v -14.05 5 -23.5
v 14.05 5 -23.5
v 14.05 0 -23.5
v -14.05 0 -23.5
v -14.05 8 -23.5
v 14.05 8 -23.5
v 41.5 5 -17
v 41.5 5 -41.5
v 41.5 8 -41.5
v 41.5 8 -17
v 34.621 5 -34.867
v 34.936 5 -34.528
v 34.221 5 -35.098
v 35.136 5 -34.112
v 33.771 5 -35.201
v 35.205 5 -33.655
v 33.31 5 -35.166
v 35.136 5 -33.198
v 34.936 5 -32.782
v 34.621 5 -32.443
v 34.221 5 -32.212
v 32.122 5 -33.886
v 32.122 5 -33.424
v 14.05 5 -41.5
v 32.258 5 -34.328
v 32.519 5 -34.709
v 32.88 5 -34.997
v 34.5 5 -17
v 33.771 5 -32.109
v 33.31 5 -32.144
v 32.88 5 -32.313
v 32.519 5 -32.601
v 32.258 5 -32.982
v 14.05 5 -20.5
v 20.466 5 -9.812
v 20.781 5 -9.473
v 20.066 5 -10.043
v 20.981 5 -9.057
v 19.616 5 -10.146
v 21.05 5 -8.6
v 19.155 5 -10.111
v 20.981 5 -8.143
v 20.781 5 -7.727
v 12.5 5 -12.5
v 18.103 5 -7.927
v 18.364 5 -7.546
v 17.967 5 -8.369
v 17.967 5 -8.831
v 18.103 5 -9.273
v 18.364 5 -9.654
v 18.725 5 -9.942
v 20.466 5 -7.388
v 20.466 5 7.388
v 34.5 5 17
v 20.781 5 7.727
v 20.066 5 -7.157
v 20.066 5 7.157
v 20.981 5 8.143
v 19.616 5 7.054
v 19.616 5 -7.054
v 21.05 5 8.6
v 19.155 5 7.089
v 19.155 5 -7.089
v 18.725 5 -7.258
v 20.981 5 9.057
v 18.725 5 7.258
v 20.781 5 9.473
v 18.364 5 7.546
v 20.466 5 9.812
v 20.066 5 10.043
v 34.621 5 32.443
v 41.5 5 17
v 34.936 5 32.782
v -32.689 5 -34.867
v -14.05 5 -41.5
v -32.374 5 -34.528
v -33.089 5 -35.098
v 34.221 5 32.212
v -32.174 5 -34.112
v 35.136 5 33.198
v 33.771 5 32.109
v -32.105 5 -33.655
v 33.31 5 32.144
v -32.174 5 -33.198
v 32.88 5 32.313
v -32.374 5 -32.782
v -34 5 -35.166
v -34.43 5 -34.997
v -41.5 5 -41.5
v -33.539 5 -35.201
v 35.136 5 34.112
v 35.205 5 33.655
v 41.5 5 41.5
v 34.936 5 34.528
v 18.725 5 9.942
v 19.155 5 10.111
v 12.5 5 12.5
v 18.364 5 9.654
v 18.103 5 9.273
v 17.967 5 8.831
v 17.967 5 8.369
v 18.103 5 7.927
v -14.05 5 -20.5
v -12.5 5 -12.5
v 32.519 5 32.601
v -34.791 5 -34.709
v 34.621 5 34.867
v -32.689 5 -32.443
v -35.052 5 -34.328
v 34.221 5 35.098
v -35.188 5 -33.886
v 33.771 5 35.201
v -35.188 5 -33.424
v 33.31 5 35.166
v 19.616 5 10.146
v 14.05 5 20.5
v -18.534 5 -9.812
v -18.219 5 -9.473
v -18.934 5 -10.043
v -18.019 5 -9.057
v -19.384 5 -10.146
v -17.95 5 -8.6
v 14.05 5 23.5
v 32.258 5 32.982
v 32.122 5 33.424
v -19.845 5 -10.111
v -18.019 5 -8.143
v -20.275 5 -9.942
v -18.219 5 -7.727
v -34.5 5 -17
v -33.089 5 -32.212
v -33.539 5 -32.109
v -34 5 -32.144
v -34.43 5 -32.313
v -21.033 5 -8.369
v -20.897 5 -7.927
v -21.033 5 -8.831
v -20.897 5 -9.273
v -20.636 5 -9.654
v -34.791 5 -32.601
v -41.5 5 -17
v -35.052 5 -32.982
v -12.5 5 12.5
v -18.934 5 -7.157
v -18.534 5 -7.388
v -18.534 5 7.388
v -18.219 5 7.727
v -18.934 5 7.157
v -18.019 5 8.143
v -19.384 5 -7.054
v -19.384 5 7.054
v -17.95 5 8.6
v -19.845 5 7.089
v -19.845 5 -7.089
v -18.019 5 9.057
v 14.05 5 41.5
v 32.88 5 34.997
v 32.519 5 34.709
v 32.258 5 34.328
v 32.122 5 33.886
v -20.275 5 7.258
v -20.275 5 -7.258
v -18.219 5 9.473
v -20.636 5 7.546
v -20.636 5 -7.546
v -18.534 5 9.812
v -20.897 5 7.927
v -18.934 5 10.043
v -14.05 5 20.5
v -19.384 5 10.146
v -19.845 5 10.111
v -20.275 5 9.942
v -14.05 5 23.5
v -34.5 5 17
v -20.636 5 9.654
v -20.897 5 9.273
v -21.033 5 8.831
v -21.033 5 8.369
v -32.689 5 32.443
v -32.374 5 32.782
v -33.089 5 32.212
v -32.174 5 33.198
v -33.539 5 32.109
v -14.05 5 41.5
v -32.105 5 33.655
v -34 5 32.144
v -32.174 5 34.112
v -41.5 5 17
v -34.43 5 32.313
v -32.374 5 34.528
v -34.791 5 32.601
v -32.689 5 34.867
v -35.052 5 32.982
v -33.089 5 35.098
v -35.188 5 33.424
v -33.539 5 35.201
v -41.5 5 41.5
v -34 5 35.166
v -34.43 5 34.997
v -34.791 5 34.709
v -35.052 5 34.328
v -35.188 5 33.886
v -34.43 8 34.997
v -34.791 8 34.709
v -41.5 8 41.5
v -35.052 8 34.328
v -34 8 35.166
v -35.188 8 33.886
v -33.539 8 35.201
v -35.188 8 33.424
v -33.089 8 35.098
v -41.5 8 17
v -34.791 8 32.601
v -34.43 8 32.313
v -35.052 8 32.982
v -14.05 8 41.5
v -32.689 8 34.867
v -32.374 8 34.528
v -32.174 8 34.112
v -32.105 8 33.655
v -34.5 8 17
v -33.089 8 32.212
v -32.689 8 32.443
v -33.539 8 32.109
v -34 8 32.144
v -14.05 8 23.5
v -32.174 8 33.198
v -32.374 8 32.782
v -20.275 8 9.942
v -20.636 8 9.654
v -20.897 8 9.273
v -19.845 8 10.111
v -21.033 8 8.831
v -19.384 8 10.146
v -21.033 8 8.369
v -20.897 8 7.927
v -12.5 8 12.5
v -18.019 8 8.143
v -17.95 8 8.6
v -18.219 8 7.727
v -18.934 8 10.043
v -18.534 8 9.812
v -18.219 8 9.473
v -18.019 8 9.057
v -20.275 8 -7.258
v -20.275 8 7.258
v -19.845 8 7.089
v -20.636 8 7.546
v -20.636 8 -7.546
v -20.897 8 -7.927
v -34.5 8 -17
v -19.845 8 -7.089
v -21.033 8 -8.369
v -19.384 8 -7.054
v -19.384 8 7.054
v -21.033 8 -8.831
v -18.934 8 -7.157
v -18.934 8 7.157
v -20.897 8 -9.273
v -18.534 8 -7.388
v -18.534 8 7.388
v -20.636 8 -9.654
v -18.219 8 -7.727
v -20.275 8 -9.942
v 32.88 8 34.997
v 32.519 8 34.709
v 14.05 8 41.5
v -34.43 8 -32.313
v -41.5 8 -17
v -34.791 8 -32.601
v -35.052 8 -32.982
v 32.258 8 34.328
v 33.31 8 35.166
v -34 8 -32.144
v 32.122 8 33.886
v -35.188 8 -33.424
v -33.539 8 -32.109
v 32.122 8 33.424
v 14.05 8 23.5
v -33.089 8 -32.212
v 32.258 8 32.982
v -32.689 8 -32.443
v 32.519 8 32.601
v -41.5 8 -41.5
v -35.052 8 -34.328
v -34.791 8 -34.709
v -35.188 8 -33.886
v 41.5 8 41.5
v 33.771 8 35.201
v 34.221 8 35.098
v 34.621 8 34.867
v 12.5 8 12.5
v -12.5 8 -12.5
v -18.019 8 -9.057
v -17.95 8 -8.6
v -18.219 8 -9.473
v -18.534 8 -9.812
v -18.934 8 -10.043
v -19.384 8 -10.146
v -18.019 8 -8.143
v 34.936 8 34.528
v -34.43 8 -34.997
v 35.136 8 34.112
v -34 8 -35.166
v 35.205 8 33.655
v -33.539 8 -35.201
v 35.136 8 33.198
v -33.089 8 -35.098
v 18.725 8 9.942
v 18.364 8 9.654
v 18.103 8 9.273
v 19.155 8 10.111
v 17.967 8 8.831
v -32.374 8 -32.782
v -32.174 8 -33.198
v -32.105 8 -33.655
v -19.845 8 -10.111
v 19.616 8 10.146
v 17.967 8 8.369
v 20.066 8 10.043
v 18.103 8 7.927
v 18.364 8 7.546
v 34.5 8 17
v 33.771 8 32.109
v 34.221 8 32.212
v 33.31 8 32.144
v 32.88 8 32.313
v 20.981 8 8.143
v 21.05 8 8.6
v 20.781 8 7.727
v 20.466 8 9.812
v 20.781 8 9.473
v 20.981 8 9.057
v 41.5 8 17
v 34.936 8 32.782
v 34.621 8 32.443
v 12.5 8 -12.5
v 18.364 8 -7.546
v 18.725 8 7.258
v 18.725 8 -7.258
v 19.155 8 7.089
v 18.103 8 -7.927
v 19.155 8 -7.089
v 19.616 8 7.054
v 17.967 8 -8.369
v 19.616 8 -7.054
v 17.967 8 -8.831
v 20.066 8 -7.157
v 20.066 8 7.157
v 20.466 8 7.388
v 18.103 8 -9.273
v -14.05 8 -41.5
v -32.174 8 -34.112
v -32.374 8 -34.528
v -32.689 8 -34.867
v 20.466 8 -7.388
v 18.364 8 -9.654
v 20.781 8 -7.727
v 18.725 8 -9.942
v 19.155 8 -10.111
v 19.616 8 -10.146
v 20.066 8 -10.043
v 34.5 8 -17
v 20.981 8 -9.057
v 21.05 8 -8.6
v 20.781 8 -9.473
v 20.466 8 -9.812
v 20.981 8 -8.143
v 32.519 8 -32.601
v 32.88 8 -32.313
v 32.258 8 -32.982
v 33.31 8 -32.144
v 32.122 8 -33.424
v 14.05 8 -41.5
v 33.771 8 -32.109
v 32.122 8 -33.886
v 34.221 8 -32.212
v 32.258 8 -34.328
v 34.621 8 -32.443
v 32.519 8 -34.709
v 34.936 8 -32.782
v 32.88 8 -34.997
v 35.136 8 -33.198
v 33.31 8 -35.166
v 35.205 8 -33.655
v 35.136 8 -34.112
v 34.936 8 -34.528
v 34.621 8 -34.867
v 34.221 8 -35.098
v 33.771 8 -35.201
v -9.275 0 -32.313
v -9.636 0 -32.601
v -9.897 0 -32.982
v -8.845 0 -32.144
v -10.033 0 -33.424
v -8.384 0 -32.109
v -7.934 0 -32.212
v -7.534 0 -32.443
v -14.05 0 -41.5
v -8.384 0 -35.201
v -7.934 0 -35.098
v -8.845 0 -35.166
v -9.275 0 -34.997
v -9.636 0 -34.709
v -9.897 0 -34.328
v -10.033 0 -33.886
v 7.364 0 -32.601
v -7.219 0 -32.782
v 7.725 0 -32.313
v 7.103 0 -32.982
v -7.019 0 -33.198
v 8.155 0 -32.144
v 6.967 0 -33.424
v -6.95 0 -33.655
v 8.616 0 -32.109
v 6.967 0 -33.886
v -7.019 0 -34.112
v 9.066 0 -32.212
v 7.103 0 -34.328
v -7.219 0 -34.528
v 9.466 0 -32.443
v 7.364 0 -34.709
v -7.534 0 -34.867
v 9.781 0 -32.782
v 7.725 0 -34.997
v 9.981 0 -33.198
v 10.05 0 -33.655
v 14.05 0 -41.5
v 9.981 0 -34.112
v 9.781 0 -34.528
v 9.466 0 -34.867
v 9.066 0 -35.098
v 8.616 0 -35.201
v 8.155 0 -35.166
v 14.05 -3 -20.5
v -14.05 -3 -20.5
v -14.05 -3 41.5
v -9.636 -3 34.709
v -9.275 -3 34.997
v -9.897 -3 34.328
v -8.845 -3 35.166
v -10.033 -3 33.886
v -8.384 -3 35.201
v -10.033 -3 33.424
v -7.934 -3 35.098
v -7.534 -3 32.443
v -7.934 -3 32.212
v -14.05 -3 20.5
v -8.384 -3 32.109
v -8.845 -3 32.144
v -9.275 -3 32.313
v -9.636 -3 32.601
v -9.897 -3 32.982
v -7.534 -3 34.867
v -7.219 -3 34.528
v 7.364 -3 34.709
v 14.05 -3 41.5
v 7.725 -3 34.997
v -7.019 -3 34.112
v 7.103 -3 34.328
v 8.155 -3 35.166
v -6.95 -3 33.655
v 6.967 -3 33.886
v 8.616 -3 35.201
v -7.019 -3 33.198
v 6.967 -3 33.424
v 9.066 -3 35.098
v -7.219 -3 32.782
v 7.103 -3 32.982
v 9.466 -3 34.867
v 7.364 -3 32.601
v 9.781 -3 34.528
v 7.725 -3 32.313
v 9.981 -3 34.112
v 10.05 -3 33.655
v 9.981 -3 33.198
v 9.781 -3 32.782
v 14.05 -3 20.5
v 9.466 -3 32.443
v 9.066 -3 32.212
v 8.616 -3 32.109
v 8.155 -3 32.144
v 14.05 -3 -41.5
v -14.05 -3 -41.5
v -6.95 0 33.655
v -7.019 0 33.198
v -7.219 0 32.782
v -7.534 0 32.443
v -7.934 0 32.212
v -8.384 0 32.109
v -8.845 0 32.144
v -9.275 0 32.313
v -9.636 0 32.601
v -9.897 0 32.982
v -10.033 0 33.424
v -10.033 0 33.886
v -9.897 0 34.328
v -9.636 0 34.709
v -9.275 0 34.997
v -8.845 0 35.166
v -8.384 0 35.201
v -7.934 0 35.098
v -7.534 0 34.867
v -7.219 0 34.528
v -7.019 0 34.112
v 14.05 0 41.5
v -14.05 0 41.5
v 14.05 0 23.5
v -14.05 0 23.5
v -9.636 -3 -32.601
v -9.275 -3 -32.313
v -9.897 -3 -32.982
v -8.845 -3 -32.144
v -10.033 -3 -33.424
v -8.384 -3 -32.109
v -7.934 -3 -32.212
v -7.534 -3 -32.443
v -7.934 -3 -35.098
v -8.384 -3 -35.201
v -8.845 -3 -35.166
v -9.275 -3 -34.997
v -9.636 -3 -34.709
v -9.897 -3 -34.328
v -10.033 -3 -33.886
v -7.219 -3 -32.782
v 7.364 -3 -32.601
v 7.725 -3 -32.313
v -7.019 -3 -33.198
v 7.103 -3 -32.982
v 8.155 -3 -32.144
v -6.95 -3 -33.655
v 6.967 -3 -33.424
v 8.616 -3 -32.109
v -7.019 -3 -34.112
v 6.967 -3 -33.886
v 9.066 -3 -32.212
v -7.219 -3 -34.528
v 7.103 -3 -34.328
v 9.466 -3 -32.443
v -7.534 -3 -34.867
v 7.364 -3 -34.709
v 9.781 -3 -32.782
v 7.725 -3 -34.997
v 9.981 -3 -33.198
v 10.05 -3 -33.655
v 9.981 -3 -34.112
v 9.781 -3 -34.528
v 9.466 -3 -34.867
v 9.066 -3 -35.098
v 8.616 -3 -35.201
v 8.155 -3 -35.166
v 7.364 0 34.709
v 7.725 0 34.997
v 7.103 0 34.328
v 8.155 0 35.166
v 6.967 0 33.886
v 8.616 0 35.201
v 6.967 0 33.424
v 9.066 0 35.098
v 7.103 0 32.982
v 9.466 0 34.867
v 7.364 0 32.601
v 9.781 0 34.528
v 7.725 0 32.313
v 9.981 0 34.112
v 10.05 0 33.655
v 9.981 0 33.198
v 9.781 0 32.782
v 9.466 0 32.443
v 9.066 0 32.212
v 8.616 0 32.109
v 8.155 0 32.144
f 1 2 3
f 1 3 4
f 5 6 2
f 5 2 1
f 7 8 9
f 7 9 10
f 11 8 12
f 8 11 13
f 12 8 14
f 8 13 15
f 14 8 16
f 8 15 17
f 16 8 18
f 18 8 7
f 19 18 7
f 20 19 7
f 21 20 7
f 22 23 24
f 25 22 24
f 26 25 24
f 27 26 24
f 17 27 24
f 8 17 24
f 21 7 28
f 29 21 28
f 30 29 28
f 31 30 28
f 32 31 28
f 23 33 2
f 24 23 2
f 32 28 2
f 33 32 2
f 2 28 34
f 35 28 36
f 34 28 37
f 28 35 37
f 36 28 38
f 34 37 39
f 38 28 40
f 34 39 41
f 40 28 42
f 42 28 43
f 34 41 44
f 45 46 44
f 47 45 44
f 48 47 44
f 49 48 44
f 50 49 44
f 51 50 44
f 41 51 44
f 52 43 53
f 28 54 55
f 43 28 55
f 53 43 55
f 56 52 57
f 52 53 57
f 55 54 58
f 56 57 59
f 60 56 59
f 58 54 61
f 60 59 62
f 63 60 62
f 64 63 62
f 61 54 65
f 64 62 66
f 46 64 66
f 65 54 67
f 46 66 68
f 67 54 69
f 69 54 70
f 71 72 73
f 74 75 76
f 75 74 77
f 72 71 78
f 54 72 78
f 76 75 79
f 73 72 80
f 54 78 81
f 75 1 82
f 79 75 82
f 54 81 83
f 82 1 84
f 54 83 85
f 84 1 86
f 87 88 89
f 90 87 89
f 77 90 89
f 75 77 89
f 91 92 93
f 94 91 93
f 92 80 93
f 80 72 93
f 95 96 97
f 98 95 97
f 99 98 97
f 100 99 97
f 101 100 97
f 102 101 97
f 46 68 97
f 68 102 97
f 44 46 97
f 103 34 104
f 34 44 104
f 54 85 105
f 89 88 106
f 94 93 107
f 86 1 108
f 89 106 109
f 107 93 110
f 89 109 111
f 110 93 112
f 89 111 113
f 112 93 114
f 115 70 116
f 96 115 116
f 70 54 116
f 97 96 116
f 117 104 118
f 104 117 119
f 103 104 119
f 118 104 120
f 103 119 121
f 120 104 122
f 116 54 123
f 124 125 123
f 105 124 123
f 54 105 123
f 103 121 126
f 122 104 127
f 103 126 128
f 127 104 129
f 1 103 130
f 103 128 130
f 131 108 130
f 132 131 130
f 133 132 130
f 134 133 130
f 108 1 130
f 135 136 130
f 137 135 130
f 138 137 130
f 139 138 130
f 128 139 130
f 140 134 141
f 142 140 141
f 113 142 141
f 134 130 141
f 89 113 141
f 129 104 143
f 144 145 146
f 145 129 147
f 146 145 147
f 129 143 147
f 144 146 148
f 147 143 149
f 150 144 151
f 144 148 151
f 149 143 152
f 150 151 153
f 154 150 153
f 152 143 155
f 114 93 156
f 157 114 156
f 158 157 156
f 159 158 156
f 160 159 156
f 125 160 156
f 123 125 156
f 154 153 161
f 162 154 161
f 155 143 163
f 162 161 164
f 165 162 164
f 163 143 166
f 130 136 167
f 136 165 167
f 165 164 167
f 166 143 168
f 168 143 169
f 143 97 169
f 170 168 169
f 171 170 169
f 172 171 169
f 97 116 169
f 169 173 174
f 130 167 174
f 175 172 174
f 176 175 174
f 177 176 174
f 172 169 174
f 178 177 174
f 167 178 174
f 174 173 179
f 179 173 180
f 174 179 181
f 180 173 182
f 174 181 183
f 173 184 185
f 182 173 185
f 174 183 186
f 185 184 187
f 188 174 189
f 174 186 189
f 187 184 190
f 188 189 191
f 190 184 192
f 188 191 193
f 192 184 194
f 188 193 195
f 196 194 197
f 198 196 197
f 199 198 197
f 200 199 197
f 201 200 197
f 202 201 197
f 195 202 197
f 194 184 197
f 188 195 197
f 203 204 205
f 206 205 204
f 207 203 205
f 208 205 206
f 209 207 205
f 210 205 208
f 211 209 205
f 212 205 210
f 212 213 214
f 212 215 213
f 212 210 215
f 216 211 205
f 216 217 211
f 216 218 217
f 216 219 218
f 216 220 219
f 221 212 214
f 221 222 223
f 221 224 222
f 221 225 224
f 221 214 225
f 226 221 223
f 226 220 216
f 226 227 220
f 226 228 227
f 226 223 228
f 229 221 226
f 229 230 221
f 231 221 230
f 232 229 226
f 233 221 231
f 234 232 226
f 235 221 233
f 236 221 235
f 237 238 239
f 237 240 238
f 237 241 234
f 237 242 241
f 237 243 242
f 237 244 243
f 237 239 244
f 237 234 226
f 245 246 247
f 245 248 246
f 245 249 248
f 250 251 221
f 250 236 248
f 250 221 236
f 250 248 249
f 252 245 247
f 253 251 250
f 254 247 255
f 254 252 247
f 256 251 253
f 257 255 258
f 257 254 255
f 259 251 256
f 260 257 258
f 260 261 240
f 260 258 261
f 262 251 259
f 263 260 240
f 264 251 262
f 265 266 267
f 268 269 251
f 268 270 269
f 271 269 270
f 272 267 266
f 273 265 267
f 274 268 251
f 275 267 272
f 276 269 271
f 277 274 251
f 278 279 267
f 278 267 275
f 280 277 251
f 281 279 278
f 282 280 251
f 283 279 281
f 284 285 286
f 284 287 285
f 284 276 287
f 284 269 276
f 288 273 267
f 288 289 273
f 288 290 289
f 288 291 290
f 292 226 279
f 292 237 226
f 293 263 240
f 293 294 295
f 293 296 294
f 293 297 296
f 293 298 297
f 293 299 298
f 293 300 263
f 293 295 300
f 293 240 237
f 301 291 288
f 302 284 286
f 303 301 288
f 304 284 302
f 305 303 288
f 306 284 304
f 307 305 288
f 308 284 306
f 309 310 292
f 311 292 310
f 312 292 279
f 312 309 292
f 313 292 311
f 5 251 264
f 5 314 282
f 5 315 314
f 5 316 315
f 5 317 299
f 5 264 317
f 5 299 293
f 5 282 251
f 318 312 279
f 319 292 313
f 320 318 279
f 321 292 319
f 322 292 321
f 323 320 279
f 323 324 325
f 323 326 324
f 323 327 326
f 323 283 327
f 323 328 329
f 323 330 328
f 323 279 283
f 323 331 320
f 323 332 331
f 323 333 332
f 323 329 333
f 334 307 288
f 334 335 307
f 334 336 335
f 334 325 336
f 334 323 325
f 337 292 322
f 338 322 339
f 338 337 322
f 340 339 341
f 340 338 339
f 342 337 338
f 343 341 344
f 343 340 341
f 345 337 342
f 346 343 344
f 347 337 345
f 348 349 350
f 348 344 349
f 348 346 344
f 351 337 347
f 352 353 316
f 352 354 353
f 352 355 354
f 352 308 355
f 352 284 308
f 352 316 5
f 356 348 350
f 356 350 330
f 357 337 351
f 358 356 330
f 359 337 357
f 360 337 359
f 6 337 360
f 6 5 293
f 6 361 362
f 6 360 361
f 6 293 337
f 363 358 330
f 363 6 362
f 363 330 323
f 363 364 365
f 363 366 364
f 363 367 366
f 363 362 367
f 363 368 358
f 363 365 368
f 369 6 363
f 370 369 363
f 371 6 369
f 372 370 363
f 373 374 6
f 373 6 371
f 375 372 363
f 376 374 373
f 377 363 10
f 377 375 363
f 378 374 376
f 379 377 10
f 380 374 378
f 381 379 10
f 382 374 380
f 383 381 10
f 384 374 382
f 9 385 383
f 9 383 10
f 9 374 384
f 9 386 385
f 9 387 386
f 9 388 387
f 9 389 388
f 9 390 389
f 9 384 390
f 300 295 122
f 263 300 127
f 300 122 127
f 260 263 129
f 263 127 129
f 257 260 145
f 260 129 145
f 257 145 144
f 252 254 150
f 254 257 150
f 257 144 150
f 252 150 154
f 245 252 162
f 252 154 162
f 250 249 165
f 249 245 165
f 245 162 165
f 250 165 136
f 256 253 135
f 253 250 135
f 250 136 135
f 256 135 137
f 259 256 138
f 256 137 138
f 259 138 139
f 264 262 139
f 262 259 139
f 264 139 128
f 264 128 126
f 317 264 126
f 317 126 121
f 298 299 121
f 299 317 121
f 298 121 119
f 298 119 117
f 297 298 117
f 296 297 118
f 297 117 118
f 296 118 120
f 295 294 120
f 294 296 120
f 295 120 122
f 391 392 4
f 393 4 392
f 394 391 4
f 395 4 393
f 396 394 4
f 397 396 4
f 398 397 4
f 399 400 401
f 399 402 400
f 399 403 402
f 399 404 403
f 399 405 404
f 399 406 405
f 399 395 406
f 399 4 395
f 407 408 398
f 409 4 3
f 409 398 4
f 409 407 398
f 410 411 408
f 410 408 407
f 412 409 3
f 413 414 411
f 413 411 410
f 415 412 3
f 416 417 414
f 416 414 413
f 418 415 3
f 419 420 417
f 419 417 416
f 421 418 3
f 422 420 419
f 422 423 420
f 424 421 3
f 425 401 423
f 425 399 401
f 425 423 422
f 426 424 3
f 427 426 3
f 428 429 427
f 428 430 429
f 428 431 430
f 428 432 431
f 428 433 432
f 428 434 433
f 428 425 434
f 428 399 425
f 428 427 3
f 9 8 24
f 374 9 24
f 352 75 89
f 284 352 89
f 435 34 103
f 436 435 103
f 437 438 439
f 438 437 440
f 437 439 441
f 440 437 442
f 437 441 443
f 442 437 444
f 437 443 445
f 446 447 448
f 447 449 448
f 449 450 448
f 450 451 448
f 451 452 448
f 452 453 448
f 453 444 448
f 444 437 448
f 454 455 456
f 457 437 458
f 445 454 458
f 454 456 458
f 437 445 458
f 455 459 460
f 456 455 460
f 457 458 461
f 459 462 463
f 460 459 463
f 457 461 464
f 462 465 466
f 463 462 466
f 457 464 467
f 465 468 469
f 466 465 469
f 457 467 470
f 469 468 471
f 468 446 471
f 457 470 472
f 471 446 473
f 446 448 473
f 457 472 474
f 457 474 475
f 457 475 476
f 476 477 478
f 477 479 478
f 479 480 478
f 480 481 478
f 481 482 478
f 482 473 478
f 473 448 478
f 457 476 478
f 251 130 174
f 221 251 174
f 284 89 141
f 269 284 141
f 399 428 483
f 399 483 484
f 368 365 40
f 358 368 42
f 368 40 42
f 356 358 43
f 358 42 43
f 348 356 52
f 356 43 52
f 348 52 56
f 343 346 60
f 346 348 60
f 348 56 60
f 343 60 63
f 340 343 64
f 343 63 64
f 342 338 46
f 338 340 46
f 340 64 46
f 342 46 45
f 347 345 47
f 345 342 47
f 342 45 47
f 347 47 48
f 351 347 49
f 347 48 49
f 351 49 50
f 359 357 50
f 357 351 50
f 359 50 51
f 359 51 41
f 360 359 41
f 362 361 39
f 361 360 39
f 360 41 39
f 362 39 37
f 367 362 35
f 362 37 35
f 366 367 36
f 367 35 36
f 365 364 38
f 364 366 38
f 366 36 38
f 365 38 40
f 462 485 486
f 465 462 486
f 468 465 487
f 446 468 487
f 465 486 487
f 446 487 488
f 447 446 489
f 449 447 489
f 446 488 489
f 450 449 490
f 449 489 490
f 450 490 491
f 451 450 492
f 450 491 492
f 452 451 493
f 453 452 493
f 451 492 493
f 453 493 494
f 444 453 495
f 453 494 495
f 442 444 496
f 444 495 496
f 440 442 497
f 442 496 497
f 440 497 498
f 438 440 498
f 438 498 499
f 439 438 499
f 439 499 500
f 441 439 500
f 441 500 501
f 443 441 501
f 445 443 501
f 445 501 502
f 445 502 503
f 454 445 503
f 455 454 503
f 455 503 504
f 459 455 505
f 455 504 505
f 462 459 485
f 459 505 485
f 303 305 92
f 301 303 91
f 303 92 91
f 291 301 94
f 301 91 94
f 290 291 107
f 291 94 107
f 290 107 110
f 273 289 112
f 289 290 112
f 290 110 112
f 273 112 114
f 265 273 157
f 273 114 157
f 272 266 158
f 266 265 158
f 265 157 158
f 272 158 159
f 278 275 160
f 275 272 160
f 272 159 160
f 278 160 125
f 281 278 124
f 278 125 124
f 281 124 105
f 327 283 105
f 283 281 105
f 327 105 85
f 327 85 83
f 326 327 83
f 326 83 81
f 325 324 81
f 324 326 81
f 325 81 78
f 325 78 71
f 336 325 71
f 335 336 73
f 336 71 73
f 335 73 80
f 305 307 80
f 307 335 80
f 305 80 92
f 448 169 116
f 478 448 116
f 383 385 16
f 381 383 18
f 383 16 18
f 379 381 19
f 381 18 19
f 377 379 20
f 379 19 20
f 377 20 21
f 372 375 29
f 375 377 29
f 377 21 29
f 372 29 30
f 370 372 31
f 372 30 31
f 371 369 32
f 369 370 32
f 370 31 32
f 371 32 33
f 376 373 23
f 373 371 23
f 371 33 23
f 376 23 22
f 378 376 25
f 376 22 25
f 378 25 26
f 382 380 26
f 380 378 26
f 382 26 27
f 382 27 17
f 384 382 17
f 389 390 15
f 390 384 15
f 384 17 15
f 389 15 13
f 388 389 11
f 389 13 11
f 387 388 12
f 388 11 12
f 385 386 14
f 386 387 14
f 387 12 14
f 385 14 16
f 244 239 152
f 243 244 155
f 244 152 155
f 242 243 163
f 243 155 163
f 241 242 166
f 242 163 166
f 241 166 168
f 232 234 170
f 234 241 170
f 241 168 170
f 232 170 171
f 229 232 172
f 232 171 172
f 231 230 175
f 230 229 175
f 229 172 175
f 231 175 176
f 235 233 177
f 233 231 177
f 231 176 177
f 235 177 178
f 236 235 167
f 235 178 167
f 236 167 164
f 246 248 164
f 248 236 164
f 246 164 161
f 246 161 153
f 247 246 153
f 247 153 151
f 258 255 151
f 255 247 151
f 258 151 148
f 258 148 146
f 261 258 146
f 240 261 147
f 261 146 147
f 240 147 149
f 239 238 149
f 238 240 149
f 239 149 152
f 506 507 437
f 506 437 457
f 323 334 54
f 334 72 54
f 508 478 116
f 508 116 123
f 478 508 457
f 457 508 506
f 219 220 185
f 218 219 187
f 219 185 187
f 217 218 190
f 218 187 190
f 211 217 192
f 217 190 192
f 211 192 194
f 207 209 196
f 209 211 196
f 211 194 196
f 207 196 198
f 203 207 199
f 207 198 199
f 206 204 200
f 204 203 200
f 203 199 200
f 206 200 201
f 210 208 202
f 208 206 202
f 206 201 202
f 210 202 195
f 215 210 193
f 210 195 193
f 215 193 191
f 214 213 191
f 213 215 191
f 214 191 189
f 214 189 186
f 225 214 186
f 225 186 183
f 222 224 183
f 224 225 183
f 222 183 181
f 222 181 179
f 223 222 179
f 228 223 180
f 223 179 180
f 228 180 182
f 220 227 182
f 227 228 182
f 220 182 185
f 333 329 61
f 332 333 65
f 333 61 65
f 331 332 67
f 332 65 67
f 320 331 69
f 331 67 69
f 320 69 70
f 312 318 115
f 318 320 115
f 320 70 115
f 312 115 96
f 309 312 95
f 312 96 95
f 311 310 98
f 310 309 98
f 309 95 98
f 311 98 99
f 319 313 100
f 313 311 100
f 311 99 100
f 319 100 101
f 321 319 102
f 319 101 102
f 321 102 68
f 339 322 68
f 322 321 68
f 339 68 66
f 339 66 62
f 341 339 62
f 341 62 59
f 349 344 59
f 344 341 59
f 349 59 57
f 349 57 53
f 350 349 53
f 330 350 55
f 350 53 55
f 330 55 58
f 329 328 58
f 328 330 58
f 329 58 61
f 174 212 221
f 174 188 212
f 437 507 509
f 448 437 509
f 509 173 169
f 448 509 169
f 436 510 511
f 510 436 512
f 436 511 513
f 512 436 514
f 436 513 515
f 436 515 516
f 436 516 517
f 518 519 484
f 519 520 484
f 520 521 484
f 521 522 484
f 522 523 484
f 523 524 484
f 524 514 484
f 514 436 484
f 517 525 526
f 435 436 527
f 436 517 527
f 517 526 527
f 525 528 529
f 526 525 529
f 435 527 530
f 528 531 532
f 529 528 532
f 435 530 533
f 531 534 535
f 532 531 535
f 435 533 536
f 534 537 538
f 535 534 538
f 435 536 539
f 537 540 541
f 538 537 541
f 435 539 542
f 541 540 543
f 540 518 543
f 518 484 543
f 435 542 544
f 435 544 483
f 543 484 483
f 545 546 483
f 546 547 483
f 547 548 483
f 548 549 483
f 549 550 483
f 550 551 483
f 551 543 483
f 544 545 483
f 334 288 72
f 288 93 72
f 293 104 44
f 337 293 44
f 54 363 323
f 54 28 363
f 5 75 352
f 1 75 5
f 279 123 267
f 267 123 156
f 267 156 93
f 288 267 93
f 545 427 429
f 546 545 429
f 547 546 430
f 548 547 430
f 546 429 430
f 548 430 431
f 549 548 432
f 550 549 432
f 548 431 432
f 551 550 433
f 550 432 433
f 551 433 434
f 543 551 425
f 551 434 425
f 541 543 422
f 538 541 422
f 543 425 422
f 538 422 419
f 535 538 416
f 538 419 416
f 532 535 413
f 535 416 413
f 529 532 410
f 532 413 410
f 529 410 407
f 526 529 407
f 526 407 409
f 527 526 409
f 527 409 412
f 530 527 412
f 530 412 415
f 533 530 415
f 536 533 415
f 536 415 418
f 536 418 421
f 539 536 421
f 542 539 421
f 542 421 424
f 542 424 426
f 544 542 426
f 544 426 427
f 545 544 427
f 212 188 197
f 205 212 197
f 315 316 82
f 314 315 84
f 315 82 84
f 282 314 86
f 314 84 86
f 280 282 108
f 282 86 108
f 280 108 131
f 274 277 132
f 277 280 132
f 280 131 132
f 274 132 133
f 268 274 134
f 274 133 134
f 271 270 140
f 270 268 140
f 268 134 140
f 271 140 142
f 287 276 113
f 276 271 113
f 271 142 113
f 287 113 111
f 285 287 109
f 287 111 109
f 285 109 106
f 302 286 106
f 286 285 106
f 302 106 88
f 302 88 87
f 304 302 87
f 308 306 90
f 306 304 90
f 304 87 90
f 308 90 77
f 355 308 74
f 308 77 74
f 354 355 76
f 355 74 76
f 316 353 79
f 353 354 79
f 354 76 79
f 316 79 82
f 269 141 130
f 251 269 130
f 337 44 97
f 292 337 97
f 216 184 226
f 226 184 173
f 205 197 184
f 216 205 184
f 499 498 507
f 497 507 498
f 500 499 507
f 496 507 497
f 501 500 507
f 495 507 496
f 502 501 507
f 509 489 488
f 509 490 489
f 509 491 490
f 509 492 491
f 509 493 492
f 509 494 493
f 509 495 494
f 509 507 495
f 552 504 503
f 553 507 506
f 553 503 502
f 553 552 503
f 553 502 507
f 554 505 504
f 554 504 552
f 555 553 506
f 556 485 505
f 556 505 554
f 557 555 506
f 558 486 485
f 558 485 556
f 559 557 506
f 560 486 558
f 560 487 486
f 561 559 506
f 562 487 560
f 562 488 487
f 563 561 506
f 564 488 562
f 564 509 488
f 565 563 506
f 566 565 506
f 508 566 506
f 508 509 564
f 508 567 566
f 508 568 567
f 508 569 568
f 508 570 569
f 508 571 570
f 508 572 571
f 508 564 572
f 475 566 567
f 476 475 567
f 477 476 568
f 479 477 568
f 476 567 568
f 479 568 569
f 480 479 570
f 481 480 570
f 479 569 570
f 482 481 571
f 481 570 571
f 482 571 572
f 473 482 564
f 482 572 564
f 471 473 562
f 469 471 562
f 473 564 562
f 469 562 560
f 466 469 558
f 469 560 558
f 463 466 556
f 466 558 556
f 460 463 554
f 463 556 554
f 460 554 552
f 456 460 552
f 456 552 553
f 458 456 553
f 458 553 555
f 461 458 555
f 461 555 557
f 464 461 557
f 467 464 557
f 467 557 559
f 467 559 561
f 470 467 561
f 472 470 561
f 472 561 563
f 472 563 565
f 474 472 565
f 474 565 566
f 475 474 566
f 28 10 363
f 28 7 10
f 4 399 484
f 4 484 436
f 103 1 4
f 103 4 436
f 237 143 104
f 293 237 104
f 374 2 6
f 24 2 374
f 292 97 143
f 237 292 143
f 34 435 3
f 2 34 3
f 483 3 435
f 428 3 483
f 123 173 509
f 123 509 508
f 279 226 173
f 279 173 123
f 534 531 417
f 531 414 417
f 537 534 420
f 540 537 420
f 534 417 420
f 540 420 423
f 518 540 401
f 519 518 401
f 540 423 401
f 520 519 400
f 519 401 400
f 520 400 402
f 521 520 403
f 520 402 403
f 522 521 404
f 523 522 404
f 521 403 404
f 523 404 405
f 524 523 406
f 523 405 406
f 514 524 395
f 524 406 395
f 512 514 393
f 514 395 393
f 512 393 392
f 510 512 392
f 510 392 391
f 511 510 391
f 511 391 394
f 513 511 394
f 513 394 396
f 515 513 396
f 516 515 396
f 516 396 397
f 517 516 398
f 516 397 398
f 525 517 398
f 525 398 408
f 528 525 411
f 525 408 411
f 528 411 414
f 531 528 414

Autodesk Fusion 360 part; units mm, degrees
sketch "Sketch1" plane through (0, 0, 0) normal (0, 1, 0) x (1, 0, 0)
  line L0 (41.5, 41.5) -> (-41.5, 41.5)
  line L1 (-41.5, -41.5) -> (41.5, -41.5)
  line L2 (-41.5, 41.5) -> (41.5, -41.5) construction
  line L3 (41.5, 41.5) -> (41.5, 17)
  line L4 (41.5, 17) -> (34.5, 17)
  line L5 (-41.5, 41.5) -> (-41.5, 17)
  line L6 (-41.5, 17) -> (-34.5, 17)
  line L7 (-41.5, -17) -> (-34.5, -17)
  line L8 (41.5, -17) -> (34.5, -17)
  line L9 (-34.5, 17) -> (-34.5, -17)
  line L10 (34.5, 17) -> (34.5, -17)
  line L11 (-41.5, 41.5) -> (-41.5, 17)
  line L12 (-41.5, -17) -> (-41.5, -41.5)
  line L13 (-41.5, -41.5) -> (-41.5, -17)
  line L14 (-41.5, 17) -> (-41.5, 41.5)
  line L15 (41.5, -41.5) -> (41.5, -17)
  line L16 (41.5, 17) -> (41.5, 41.5)
  line L17 (41.5, 41.5) -> (41.5, 17)
  line L18 (41.5, -17) -> (41.5, -41.5)
  line L19 (-34.5, 17) -> (-34.5, 8.6)
  line L20 (-34.5, -17) -> (-34.5, -8.6)
  line L21 (34.5, 17) -> (34.5, 8.6)
  line L22 (34.5, -17) -> (34.5, -8.6)
  line L23 (-41.5, 41.5) -> (-33.655, 41.5)
  line L24 (-33.655, 41.5) -> (-41.5, 41.5)
  line L25 (-41.5, 41.5) -> (-41.5, 33.655)
  circle A0 centre (-33.655, 33.655) radius 1.55
  circle A1 centre (33.655, 33.655) radius 1.55
  circle A2 centre (-33.655, -33.655) radius 1.55
  circle A3 centre (33.655, -33.655) radius 1.55
  line L26 (11, 11) -> (-11, -11) construction
  line L27 (-11, 11) -> (11, -11) construction
  line L28 (12.5, -12.5) -> (-12.5, -12.5)
  line L29 (-12.5, -12.5) -> (-12.5, 12.5)
  line L30 (-12.5, 12.5) -> (12.5, 12.5)
  line L31 (12.5, 12.5) -> (12.5, -12.5)
  line L32 (12.5, -12.5) -> (-12.5, 12.5) construction
  line L33 (-12.5, -12.5) -> (12.5, 12.5) construction
  line L34 (-41.5, 41.5) -> (-14.05, 41.5)
  line L35 (-14.05, 41.5) -> (-8.5, 41.5)
  circle A4 centre (-8.5, 33.655) radius 1.55
  circle A5 centre (8.5, 33.655) radius 1.55
  line L36 (-14.05, 41.5) -> (-14.05, 23.5)
  line L37 (-14.05, 23.5) -> (14.05, 23.5)
  line L38 (14.05, 23.5) -> (14.05, 41.5)
  line L39 (-14.05, -23.5) -> (14.05, -23.5)
  circle A6 centre (8.5, -33.655) radius 1.55
  circle A7 centre (-8.5, -33.655) radius 1.55
  line L40 (-14.05, -41.5) -> (-14.05, -23.5)
  line L41 (14.05, -23.5) -> (14.05, -41.5)
  circle A8 centre (-19.5, 8.6) radius 1.55
  circle A9 centre (-19.5, -8.6) radius 1.55
  circle A10 centre (19.5, 8.6) radius 1.55
  circle A11 centre (19.5, -8.6) radius 1.55
  point P0 (-19.5, 8.6)
  point P1 (19.5, 8.6)
  dimension "d1" = 83
  dimension "d2" = 83
  dimension "d31" = 27.45
  dimension "d32" = 5.55
  dimension "d33" = 7.845
  dimension "d34" = 17
  dimension "d35" = 3.1
  dimension "d36" = 3.1
  dimension "d37" = 18
  dimension "d39" = 18
  dimension "d40" = 3.1
extrude "Extrude4" add sketch "Sketch1" along normal blind 8 contours L0 L1 L3 L4 L5 L6 L7 L8 L9 L10 L11 L12 L13 L14 L15 L16 L17 L18 L19 L20 L21 L22 L23 L24 L25 L34 L36 L37 L38 L39 L40 L41 makes body 1
sketch "Sketch2" plane through (0, 8, 0) normal (0, 1, 0) x (-1, 0, 0)
  circle A0 centre (-19.5, -8.6) radius 1.55
  circle A1 centre (33.655, 33.655) radius 1.55
  circle A2 centre (19.5, -8.6) radius 1.55
  circle A3 centre (19.5, 8.6) radius 1.55
  circle A4 centre (-19.5, 8.6) radius 1.55
  line L0 (12.5, -12.5) -> (-12.5, -12.5)
  line L1 (-12.5, -12.5) -> (-12.5, 12.5)
  line L2 (-12.5, 12.5) -> (12.5, 12.5)
  line L3 (12.5, 12.5) -> (12.5, -12.5)
  circle A5 centre (-33.655, -33.655) radius 1.55
  circle A6 centre (33.655, -33.655) radius 1.55
  circle A7 centre (-33.655, 33.655) radius 1.55
  line L4 (41.5, 41.5) -> (14.05, 41.5)
  line L5 (14.05, 41.5) -> (14.05, 23.5)
  line L6 (14.05, 23.5) -> (-14.05, 23.5)
  line L7 (-14.05, 23.5) -> (-14.05, 41.5)
  line L8 (-14.05, 41.5) -> (-41.5, 41.5)
  line L9 (-41.5, 41.5) -> (-41.5, 17)
  line L10 (-41.5, 17) -> (-34.5, 17)
  line L11 (-34.5, 17) -> (-34.5, -17)
  line L12 (-34.5, -17) -> (-41.5, -17)
  line L13 (-41.5, -17) -> (-41.5, -41.5)
  line L14 (-41.5, -41.5) -> (-14.05, -41.5)
  line L15 (-14.05, -41.5) -> (-14.05, -23.5)
  line L16 (-14.05, -23.5) -> (14.05, -23.5)
  line L17 (14.05, -23.5) -> (14.05, -41.5)
  line L18 (14.05, -41.5) -> (41.5, -41.5)
  line L19 (41.5, -41.5) -> (41.5, -17)
  line L20 (41.5, -17) -> (34.5, -17)
  line L21 (34.5, -17) -> (34.5, 17)
  line L22 (34.5, 17) -> (41.5, 17)
  line L23 (41.5, 17) -> (41.5, 41.5)
extrude "Extrude5" cut sketch "Sketch2" against normal blind 3 keep common part bodies 1
sketch "Sketch3" plane through (0, 0, 23.5) normal (0, 0, 1) x (1, 0, 0)
  line L0 (-14.05, 5) -> (14.05, 5)
  line L1 (14.05, 5) -> (14.05, 8)
  line L2 (14.05, 8) -> (-14.05, 8)
  line L3 (-14.05, 8) -> (-14.05, 5)
  line L4 (-14.05, 8) -> (-14.05, 0)
  line L5 (-14.05, 0) -> (14.05, 0)
  line L6 (14.05, 0) -> (14.05, 8)
  line L7 (14.05, 8) -> (-14.05, 8)
  line L8 (-14.05, 8) -> (-14.05, 0)
  line L9 (-14.05, 0) -> (14.05, 0)
  dimension "d47" = 28.1
extrude "Extrude6" add sketch "Sketch3" against normal blind 3 contours L0 L4 L5 L6 L8 L9 bodies 1
extrude "Extrude7" add sketch "Sketch1" against normal blind 3 separate body contours L1 L39 L40 L41 makes body 2
sketch "Sketch4" plane through (0, 0, 23.5) normal (0, 0, 1) x (1, 0, 0)
  line L0 (14.05, 5) -> (14.05, 8)
  line L1 (14.05, 8) -> (-14.05, 8)
  line L2 (-14.05, 8) -> (-14.05, 5)
  line L3 (-14.05, 5) -> (-14.05, 0)
  line L4 (-14.05, 0) -> (14.05, 0)
  line L5 (14.05, 0) -> (14.05, 5)
  line L6 (-14.05, 0) -> (-14.05, -3)
  line L7 (-14.05, -3) -> (14.05, -3)
  line L8 (-14.05, 0) -> (14.05, 0)
  line L9 (14.05, 0) -> (14.05, -3)
  line L10 (14.05, -3) -> (-14.05, -3)
  line L11 (-14.05, -3) -> (-14.05, 0)
  dimension "d52" = 3
  dimension "d53" = 28.1
extrude "Extrude8" add sketch "Sketch4" against normal blind 3 contours L4 L6 L7 L8 L9 L10 L11 bodies 1 2
sketch "Sketch5" plane through (0, 0, -23.5) normal (0, 0, -1) x (-1, 0, 0)
  line L0 (-14.05, 5) -> (14.05, 5)
  line L1 (14.05, 5) -> (14.05, 8)
  line L2 (14.05, 8) -> (-14.05, 8)
  line L3 (-14.05, 8) -> (-14.05, 5)
  line L4 (-14.05, 5) -> (-14.05, -3)
  line L5 (-14.05, -3) -> (14.05, -3)
  line L6 (14.05, -3) -> (-14.05, -3)
  line L7 (-14.05, -3) -> (-14.05, 5)
  line L8 (-14.05, 5) -> (14.05, 5)
  line L9 (14.05, 5) -> (14.05, -3)
  dimension "d56" = 8
  dimension "d57" = 28.1
extrude "Extrude9" add sketch "Sketch5" against normal blind 3 contours L0 L4 L5 L6 L7 L8 L9 bodies 1
extrude "Extrude10" add sketch "Sketch1" against normal blind 3 contours L0 L35 L36 L37 L38 bodies 1
